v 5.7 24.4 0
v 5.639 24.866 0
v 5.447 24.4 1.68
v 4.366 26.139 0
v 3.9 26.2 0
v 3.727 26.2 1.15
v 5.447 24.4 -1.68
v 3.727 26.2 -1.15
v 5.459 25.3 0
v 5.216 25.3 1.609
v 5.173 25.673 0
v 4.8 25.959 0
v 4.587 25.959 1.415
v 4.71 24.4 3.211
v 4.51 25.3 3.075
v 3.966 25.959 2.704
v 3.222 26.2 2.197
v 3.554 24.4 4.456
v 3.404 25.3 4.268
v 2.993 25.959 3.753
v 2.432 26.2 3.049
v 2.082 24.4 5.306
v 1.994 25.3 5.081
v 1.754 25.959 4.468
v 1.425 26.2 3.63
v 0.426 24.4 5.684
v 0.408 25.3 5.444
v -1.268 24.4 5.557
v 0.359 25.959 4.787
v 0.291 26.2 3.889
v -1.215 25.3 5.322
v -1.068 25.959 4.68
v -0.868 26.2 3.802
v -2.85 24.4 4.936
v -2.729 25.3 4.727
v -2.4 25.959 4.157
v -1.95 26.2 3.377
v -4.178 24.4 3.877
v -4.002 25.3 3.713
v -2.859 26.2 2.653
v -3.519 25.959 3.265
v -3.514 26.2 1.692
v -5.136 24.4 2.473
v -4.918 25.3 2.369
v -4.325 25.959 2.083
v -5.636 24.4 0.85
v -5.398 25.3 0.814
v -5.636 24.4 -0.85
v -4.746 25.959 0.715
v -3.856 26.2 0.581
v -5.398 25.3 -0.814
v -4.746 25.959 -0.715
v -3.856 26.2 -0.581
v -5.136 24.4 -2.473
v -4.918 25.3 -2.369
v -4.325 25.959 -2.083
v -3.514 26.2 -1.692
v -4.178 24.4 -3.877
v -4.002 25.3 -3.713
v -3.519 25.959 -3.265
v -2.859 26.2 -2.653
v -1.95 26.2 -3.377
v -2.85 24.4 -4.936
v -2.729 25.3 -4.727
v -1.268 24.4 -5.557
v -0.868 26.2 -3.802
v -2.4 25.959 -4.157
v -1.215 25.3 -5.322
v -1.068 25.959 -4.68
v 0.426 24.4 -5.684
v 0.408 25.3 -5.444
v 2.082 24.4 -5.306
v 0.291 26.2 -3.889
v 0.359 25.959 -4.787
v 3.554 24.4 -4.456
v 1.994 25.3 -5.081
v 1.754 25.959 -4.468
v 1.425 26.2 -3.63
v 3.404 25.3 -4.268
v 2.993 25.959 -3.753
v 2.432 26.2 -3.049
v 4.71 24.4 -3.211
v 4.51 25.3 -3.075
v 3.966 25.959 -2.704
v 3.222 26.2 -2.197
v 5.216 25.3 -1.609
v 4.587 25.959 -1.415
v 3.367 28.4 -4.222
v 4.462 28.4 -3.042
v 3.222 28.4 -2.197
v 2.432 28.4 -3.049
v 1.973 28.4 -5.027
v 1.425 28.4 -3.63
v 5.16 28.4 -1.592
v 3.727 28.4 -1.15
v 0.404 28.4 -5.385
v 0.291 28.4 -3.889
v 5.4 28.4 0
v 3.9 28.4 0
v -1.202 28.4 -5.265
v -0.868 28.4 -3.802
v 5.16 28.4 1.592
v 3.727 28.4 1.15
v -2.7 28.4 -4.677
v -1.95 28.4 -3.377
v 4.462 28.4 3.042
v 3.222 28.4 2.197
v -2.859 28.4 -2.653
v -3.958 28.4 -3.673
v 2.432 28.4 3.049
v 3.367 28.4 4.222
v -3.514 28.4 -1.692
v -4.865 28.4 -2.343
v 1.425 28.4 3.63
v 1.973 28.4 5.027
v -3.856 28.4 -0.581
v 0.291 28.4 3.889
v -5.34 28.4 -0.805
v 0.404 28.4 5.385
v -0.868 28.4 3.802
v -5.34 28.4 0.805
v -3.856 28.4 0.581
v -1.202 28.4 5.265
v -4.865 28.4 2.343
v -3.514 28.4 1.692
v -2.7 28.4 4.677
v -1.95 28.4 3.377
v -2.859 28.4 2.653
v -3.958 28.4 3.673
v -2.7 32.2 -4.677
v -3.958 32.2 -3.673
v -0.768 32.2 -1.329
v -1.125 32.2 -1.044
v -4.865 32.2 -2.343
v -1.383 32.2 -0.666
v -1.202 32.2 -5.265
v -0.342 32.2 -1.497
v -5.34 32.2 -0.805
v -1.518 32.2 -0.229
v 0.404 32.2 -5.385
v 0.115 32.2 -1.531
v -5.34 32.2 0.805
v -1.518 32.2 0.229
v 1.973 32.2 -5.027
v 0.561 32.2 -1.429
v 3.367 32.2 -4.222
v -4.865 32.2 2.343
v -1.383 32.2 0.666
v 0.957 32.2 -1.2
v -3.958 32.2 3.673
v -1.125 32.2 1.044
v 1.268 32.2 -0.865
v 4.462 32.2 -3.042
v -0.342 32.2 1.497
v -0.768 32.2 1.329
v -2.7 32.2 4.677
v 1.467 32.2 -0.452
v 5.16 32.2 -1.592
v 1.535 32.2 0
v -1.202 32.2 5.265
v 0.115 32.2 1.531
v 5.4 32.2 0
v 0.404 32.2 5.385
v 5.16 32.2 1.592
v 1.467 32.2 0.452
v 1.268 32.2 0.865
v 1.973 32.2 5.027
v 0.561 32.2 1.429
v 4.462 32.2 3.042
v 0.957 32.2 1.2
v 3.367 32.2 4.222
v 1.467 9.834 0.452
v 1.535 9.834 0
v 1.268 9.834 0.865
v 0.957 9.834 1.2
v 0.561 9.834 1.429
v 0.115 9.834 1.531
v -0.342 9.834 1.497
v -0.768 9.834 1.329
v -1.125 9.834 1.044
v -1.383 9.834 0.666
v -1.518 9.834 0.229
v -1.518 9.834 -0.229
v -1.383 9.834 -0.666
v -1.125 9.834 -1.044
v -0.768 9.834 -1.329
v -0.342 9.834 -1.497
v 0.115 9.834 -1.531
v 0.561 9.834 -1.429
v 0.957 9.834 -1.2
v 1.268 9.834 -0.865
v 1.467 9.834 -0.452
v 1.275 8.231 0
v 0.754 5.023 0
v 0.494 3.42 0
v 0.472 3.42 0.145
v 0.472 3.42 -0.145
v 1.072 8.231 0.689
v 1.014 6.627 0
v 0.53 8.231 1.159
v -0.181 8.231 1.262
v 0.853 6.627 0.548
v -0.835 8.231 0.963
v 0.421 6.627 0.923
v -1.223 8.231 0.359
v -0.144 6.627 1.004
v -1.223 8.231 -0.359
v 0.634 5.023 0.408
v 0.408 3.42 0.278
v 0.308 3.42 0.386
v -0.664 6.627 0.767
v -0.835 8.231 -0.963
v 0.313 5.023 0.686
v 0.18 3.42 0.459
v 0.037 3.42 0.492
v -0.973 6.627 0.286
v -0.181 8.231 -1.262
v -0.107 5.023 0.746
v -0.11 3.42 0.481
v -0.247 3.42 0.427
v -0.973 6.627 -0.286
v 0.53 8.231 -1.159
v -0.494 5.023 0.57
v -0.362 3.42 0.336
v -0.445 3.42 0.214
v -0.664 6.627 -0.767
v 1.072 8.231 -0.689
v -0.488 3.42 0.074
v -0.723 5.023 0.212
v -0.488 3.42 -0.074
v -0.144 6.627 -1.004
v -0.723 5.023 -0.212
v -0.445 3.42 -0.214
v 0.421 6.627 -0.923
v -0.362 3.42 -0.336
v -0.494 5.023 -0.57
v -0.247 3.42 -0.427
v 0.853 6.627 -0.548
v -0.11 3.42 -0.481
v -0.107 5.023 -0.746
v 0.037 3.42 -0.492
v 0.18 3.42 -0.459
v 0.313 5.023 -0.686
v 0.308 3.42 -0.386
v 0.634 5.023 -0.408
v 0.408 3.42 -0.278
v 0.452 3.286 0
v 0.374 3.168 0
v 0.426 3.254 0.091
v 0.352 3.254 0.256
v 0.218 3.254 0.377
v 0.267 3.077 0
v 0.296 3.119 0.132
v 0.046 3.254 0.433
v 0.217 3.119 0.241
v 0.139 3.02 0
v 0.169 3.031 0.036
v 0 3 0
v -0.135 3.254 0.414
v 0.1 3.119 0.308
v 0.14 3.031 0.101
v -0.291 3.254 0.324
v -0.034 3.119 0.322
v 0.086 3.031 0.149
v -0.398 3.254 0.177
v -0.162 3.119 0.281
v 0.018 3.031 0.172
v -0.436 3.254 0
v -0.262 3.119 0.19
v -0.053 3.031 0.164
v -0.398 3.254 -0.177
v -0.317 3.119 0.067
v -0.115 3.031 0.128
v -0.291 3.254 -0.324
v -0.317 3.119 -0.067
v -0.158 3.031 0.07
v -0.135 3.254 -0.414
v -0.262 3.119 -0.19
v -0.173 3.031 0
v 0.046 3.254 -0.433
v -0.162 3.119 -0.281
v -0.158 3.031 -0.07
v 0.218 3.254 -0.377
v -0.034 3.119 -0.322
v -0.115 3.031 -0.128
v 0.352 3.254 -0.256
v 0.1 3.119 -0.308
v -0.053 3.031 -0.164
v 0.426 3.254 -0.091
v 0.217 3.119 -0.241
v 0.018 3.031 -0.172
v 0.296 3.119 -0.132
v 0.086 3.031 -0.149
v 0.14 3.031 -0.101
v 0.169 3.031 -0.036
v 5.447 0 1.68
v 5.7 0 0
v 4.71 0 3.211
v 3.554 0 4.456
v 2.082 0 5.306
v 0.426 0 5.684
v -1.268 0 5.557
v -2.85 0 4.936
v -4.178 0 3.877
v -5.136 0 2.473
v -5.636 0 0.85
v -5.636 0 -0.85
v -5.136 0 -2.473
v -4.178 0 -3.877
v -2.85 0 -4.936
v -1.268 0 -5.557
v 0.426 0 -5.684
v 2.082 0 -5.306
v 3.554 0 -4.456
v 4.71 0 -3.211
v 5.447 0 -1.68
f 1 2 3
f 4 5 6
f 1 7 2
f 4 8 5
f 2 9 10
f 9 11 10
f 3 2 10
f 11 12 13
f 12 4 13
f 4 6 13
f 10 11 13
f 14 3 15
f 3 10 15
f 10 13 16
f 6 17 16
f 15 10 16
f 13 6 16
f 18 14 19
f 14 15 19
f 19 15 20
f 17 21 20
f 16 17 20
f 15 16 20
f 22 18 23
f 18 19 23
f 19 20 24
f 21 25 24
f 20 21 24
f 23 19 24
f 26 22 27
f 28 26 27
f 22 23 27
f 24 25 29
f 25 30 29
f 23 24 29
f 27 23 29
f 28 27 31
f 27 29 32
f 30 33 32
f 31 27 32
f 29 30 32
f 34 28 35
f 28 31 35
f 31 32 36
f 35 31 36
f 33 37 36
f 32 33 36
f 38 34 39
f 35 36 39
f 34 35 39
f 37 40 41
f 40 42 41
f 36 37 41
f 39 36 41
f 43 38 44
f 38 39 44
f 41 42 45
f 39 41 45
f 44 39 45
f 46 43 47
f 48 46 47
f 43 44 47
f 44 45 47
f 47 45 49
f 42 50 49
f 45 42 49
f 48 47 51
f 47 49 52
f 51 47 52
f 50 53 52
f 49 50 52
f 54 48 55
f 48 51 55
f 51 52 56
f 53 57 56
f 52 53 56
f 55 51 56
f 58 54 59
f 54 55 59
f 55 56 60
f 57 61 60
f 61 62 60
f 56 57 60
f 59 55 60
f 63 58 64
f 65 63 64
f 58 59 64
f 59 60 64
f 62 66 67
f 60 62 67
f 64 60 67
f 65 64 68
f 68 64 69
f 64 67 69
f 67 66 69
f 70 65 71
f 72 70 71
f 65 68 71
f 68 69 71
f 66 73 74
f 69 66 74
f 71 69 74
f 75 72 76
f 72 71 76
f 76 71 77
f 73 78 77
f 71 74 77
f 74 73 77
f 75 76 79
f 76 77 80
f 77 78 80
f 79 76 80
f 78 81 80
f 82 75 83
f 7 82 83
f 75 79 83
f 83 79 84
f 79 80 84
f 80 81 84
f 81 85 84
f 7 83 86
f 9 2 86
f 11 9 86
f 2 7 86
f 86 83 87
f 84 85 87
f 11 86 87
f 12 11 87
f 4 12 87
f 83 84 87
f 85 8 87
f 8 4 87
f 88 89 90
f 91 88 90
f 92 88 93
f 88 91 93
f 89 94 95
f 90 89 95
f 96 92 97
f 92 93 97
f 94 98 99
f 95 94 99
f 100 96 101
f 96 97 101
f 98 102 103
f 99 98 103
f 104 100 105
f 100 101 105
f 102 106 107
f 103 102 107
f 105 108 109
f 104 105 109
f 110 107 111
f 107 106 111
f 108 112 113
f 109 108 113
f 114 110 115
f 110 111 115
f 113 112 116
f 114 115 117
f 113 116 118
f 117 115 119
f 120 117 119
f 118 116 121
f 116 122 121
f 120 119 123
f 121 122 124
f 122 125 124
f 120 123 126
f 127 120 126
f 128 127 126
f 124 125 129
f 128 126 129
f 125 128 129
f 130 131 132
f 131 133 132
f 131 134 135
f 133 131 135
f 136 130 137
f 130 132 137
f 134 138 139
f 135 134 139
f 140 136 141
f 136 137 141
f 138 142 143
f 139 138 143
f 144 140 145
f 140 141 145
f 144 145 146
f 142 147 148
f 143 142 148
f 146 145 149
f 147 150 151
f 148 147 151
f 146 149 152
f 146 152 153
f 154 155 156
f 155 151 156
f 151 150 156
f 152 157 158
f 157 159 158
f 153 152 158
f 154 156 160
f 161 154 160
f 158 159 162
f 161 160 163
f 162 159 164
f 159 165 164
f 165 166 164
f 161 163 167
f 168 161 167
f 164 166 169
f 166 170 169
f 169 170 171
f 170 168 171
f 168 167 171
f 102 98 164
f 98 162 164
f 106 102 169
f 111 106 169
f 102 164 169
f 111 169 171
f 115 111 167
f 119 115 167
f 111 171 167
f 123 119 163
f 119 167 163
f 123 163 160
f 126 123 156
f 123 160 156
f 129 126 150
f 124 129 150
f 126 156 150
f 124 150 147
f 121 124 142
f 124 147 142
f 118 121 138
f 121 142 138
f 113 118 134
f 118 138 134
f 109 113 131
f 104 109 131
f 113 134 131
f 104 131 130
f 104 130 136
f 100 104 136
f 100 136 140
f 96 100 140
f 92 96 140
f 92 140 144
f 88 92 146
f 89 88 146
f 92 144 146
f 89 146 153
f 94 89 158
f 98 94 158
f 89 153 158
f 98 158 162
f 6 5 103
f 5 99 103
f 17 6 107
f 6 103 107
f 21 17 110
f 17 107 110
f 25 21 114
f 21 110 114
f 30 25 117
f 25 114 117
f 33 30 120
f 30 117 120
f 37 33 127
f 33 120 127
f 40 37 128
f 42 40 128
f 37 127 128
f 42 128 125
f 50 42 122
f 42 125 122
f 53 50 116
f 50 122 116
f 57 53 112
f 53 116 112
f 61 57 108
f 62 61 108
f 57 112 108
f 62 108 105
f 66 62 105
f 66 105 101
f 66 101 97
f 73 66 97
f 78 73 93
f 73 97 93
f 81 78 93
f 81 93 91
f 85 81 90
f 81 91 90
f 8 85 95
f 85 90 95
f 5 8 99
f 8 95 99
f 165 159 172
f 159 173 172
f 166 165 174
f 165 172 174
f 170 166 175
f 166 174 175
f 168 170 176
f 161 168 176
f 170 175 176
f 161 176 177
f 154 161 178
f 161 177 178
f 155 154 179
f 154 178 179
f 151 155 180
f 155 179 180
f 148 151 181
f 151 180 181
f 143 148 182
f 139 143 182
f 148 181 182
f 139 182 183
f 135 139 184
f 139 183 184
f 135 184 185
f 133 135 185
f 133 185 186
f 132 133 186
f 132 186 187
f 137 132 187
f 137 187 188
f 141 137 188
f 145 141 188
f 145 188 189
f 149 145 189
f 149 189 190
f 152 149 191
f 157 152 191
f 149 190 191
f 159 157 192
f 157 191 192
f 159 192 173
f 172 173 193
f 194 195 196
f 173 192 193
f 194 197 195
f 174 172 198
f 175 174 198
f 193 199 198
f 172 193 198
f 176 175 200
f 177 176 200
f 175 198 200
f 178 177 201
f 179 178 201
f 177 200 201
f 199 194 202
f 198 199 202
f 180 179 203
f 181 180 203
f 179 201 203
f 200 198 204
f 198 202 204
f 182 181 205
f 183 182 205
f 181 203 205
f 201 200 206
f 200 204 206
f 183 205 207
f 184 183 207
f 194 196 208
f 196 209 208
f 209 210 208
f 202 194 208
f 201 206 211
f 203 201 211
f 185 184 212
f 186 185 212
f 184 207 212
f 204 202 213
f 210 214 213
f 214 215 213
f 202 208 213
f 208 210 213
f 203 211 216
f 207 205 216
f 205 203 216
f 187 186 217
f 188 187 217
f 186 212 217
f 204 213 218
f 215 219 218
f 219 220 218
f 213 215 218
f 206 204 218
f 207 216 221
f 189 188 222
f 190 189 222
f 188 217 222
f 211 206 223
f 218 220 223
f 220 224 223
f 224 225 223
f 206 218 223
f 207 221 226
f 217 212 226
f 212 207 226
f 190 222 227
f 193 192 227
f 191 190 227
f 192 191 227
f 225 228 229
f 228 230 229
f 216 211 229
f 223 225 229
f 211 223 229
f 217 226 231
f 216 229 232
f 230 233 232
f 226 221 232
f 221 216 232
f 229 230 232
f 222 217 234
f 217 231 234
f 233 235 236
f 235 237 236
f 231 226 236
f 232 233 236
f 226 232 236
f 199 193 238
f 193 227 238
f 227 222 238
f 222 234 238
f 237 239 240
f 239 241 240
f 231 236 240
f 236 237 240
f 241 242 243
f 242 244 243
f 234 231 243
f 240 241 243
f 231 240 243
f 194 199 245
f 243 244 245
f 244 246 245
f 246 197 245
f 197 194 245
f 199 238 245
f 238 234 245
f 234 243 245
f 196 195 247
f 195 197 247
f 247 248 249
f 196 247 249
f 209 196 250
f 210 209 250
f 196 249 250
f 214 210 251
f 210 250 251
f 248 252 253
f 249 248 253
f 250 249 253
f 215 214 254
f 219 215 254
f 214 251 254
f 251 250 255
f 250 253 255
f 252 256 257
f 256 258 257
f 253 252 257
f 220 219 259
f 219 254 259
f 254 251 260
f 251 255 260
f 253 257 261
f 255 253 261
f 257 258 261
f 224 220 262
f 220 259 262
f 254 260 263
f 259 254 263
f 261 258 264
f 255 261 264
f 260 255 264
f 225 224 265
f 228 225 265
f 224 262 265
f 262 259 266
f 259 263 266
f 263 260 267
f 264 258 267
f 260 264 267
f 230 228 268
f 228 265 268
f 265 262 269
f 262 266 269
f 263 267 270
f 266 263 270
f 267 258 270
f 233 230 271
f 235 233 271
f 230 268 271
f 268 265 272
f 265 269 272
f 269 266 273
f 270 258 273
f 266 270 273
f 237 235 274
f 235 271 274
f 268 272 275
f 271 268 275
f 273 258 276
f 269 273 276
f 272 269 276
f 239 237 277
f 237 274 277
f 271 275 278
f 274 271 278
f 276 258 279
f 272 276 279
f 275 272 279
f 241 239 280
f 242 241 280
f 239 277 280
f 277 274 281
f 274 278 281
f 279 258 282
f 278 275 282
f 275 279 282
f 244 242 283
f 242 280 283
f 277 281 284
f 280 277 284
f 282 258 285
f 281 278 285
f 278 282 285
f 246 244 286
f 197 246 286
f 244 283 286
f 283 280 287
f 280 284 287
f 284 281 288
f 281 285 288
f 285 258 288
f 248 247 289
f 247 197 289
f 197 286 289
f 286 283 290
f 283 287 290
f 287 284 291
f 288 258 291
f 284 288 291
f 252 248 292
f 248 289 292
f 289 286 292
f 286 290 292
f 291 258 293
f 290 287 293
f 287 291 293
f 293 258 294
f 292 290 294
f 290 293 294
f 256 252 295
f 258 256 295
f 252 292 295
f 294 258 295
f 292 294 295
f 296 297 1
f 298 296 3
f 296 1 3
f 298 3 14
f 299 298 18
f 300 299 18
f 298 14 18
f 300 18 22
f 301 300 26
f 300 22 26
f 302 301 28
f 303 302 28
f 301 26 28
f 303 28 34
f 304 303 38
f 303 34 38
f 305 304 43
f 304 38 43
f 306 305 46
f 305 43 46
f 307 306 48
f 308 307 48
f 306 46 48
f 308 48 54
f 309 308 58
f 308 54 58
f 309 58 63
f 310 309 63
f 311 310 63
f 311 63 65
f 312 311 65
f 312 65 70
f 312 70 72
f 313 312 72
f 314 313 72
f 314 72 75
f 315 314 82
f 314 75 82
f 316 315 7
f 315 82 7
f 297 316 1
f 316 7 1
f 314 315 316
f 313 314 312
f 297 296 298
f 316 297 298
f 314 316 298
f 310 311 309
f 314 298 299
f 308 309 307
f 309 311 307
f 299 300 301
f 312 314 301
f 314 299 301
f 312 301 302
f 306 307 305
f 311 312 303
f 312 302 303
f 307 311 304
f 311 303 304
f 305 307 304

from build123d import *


with BuildPart() as part:
    # Sketch2 → Revolve1 (revolve)
    with BuildSketch(Plane.XY):
        with BuildLine():
            Line((0, 0), (5.7, 0))
            Line((5.7, 0), (5.7, 24.4))
            ThreePointArc((5.7, 24.4), (5.172792206, 25.672792206), (3.9, 26.2))
            Line((3.9, 26.2), (3.9, 28.4))
            Line((3.9, 28.4), (5.4, 28.4))
            Line((5.4, 28.4), (5.4, 32.2))
            Line((5.4, 32.2), (1.535, 32.2))
            Line((1.535, 32.2), (1.535, 9.834154564))
            Line((1.535, 9.834154564), (0.493536823, 3.419866334))
            ThreePointArc((0.493536823, 3.419866334), (0.323985468, 3.119167469), (0, 3))
            Line((0, 3), (0, 0))
        make_face()
    revolve(axis=Axis((0, 32.2, 0), (0, -1, 0)))


solid = part.part
